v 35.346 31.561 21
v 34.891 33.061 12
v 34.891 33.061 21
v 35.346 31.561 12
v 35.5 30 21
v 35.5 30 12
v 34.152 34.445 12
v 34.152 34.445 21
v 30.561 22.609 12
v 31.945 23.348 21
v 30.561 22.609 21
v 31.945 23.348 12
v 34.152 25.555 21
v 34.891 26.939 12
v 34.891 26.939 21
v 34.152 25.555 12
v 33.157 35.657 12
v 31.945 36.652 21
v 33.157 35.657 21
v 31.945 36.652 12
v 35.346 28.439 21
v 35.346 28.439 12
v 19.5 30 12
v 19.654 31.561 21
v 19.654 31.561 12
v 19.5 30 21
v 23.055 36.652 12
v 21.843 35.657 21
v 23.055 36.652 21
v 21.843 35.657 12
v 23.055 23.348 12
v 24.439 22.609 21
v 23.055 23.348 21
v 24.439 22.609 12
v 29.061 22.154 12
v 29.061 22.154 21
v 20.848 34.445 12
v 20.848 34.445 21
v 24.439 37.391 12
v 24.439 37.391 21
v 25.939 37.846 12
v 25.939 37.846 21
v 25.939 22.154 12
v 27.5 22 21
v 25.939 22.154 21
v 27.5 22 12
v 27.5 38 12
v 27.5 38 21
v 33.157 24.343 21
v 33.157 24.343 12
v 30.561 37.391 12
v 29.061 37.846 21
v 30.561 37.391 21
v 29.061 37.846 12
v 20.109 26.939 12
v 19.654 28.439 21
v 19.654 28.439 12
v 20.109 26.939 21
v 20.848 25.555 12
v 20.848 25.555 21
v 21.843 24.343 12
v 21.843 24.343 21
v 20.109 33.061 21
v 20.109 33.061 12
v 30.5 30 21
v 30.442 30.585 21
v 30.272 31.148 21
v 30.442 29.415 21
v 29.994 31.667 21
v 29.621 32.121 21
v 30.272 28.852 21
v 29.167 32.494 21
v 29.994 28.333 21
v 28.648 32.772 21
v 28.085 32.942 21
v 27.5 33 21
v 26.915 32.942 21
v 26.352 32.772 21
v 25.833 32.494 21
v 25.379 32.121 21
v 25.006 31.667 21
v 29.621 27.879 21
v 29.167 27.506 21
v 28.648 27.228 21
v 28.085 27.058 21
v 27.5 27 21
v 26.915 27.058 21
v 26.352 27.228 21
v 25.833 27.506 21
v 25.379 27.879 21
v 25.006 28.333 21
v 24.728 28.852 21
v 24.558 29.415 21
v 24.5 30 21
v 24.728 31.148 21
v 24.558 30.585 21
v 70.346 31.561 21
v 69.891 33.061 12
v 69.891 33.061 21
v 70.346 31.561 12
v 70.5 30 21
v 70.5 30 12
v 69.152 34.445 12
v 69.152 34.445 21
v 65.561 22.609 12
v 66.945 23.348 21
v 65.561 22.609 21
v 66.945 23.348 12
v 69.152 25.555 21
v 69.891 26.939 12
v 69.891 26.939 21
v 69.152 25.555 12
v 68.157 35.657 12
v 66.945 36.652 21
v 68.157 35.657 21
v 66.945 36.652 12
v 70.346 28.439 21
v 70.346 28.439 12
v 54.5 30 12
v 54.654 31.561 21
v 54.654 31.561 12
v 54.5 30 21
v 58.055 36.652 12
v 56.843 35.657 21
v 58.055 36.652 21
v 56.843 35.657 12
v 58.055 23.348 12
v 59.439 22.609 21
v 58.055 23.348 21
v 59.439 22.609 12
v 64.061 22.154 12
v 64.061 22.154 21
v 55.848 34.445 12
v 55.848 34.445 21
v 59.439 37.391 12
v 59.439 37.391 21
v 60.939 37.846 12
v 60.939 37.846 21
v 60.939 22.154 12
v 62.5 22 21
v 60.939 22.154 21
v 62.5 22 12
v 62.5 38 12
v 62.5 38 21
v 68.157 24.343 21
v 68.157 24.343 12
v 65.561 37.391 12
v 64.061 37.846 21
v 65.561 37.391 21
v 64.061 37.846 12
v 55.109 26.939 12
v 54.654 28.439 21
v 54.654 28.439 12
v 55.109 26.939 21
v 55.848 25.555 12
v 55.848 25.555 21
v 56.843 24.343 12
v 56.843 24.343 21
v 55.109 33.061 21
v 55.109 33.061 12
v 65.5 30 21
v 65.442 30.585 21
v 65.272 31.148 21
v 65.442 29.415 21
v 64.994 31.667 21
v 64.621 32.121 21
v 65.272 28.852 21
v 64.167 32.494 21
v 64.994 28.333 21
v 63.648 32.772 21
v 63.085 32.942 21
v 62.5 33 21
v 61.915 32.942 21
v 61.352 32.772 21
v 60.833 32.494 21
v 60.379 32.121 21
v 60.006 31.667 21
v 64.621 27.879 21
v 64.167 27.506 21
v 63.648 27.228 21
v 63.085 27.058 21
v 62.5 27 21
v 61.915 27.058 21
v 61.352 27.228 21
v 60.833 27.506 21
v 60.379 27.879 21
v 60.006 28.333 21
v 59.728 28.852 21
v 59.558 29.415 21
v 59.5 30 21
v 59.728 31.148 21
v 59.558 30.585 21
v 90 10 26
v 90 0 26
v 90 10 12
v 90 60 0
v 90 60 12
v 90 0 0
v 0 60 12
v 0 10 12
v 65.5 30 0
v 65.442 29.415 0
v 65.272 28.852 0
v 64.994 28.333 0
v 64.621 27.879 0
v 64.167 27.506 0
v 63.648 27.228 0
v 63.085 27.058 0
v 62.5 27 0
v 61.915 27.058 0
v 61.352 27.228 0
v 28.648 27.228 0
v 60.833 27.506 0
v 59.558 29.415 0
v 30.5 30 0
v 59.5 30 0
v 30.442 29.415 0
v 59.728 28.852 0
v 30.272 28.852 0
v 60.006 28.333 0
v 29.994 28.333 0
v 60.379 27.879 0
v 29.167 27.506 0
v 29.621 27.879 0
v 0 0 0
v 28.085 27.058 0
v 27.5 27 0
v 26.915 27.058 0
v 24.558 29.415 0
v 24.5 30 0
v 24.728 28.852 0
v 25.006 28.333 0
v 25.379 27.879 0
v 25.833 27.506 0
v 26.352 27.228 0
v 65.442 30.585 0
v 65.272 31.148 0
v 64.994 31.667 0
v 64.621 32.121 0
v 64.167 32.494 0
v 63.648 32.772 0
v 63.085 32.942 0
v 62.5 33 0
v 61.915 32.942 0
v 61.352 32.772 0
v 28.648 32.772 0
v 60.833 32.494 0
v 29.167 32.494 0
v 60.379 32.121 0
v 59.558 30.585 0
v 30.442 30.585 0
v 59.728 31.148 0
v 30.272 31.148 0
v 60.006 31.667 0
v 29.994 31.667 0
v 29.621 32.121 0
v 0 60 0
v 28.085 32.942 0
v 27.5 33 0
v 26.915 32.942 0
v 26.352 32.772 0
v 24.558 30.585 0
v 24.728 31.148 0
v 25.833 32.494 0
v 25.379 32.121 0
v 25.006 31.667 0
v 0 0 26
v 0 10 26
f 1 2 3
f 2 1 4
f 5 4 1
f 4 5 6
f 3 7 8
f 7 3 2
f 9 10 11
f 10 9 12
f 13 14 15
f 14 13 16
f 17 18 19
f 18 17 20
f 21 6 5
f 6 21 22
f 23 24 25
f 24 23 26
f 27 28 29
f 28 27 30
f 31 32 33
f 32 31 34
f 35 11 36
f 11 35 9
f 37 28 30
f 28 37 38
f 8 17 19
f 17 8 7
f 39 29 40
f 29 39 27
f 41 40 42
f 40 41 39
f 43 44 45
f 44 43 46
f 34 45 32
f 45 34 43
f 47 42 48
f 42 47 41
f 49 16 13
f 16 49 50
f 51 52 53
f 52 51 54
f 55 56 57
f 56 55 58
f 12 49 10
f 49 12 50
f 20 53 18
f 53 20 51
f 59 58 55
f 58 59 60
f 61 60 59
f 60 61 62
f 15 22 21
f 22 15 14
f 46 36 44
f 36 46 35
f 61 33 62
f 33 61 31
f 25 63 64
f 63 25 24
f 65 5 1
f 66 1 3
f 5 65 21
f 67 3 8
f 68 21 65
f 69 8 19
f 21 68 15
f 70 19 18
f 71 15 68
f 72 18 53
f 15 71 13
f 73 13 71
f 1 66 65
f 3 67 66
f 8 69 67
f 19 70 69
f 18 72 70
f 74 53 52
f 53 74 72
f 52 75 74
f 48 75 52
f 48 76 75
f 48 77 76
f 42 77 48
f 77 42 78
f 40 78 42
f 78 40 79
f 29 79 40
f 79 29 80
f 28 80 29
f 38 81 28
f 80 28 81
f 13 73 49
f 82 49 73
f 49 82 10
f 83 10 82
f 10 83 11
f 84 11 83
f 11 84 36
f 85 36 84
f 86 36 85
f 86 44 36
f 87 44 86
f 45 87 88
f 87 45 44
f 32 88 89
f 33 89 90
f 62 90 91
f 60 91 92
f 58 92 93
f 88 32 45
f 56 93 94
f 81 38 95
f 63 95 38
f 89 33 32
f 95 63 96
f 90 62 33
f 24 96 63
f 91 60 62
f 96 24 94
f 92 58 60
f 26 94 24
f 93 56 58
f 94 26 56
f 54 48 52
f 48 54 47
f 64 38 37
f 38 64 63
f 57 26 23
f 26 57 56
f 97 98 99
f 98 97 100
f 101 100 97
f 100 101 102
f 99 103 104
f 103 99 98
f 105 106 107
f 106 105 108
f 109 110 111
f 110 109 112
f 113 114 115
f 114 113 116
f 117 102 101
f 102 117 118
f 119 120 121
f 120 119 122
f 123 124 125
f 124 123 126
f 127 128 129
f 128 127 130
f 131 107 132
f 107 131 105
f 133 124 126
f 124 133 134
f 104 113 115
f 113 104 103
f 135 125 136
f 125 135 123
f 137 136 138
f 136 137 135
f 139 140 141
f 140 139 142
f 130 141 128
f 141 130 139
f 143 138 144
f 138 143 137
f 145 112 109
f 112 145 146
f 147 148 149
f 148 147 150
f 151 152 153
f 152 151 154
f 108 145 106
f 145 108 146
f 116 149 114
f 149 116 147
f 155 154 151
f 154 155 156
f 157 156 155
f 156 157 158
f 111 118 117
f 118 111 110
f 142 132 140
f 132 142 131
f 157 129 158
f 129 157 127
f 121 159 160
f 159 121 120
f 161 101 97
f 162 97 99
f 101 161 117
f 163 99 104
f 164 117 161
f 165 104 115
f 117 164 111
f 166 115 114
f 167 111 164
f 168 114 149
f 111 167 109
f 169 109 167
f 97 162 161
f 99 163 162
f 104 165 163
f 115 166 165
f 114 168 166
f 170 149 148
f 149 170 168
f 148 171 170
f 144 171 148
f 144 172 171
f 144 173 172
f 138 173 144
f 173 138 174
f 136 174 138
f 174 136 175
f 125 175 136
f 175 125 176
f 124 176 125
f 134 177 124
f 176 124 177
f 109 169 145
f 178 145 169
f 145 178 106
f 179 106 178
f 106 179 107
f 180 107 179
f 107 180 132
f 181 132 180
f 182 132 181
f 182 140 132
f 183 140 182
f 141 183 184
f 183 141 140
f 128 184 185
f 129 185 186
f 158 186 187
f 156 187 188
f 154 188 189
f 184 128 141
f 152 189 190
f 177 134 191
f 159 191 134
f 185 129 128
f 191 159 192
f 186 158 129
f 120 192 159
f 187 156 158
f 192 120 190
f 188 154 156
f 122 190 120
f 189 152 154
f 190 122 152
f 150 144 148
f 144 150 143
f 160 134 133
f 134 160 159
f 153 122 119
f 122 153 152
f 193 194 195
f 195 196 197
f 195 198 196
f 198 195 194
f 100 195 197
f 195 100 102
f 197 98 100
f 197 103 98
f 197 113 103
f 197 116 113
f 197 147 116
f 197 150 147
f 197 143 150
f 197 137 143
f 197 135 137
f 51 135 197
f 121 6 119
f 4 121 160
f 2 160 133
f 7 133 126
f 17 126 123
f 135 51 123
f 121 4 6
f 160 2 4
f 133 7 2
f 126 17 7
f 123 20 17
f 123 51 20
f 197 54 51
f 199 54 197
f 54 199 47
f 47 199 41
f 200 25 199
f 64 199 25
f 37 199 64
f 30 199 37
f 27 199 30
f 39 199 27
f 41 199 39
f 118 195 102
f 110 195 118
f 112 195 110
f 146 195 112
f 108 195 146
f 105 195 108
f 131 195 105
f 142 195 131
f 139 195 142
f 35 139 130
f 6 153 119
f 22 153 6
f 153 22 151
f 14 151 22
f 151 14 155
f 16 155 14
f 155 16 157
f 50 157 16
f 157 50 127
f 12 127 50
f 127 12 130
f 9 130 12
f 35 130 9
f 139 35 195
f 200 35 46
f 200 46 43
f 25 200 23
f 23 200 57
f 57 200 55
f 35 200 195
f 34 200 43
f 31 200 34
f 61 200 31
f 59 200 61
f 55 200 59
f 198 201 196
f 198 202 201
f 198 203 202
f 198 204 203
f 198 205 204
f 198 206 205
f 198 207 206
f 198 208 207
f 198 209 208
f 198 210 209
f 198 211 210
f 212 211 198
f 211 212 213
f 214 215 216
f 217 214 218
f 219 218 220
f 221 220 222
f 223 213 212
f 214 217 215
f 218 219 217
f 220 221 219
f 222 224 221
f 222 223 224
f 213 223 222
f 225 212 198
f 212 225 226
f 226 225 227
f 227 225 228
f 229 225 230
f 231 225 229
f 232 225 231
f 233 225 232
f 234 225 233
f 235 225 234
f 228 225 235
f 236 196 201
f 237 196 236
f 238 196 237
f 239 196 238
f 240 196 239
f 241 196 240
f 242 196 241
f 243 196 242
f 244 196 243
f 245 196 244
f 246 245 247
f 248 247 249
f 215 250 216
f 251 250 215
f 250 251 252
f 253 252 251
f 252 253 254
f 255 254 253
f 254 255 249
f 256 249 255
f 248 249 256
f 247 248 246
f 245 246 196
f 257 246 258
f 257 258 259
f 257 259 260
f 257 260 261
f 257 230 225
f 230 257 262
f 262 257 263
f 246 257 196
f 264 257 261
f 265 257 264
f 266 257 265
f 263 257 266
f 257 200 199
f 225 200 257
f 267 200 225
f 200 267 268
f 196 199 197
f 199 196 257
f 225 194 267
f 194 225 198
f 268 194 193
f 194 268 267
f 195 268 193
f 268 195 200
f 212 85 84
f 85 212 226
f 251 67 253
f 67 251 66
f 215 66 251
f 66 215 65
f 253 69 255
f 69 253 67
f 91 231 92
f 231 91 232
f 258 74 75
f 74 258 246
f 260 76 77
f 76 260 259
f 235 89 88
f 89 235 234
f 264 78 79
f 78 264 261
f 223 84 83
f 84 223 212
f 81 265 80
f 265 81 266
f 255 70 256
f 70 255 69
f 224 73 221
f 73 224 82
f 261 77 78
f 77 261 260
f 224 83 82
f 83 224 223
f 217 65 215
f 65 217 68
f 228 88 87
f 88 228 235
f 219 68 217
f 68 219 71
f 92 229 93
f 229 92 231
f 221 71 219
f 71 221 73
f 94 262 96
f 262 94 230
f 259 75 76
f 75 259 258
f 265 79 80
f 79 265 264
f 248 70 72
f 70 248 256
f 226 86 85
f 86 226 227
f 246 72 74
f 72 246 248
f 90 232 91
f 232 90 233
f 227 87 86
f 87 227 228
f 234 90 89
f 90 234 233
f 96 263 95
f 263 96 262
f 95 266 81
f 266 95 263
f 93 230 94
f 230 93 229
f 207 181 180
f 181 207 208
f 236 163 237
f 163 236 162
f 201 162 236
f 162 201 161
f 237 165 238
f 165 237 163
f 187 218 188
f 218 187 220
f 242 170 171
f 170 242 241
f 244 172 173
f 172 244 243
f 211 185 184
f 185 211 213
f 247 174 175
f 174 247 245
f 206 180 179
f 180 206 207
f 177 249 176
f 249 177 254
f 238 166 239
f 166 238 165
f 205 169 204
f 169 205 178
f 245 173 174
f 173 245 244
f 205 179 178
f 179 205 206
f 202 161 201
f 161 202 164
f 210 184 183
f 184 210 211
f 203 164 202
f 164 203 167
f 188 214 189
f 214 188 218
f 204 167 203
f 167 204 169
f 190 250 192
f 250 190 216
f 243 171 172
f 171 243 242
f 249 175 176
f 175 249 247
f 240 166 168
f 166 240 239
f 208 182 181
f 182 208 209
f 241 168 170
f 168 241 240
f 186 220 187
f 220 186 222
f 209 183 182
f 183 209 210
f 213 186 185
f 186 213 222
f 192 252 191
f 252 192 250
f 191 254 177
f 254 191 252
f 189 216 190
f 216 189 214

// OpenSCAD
$fn = 32;

// ----------------------------------------------------------------------
// Drill jig: fence jig
// ----------------------------------------------------------------------

// --- parameters (mm) ---
plate_l = 90;             // plate length, X
plate_w = 60;             // plate width, Y
plate_t = 12;             // plate thickness
boss_d = 16;              // guide boss diameter
boss_h = 10;              // boss height above the plate
guide_d = 6;              // guide hole diameter
boss_pitch = 35;          // boss pitch
fence_h = 15;             // fence height above the plate
fence_t = 10;             // fence thickness

n_boss = 2;  // guide bosses
boss_x0 = (plate_l - (n_boss - 1) * boss_pitch) / 2;  // first boss X
boss_top = plate_t - 1 + boss_h;  // boss crown height
fence_top = plate_t - 1 + fence_h;  // fence crown height
total_h = max([fence_top, boss_top]);  // overall height

difference() {
  union() {
  cube([plate_l, plate_w, plate_t]);
  for (i = [0 : n_boss - 1])
    translate([boss_x0 + i * boss_pitch, plate_w / 2, plate_t - 1])
      cylinder(h = boss_h, d = boss_d);
  translate([0, 0, plate_t - 1]) cube([plate_l, fence_t, fence_h]);
  }
  for (i = [0 : n_boss - 1])
    translate([boss_x0 + i * boss_pitch, plate_w / 2, -1])
      cylinder(h = plate_t + boss_h, d = guide_d);
}
